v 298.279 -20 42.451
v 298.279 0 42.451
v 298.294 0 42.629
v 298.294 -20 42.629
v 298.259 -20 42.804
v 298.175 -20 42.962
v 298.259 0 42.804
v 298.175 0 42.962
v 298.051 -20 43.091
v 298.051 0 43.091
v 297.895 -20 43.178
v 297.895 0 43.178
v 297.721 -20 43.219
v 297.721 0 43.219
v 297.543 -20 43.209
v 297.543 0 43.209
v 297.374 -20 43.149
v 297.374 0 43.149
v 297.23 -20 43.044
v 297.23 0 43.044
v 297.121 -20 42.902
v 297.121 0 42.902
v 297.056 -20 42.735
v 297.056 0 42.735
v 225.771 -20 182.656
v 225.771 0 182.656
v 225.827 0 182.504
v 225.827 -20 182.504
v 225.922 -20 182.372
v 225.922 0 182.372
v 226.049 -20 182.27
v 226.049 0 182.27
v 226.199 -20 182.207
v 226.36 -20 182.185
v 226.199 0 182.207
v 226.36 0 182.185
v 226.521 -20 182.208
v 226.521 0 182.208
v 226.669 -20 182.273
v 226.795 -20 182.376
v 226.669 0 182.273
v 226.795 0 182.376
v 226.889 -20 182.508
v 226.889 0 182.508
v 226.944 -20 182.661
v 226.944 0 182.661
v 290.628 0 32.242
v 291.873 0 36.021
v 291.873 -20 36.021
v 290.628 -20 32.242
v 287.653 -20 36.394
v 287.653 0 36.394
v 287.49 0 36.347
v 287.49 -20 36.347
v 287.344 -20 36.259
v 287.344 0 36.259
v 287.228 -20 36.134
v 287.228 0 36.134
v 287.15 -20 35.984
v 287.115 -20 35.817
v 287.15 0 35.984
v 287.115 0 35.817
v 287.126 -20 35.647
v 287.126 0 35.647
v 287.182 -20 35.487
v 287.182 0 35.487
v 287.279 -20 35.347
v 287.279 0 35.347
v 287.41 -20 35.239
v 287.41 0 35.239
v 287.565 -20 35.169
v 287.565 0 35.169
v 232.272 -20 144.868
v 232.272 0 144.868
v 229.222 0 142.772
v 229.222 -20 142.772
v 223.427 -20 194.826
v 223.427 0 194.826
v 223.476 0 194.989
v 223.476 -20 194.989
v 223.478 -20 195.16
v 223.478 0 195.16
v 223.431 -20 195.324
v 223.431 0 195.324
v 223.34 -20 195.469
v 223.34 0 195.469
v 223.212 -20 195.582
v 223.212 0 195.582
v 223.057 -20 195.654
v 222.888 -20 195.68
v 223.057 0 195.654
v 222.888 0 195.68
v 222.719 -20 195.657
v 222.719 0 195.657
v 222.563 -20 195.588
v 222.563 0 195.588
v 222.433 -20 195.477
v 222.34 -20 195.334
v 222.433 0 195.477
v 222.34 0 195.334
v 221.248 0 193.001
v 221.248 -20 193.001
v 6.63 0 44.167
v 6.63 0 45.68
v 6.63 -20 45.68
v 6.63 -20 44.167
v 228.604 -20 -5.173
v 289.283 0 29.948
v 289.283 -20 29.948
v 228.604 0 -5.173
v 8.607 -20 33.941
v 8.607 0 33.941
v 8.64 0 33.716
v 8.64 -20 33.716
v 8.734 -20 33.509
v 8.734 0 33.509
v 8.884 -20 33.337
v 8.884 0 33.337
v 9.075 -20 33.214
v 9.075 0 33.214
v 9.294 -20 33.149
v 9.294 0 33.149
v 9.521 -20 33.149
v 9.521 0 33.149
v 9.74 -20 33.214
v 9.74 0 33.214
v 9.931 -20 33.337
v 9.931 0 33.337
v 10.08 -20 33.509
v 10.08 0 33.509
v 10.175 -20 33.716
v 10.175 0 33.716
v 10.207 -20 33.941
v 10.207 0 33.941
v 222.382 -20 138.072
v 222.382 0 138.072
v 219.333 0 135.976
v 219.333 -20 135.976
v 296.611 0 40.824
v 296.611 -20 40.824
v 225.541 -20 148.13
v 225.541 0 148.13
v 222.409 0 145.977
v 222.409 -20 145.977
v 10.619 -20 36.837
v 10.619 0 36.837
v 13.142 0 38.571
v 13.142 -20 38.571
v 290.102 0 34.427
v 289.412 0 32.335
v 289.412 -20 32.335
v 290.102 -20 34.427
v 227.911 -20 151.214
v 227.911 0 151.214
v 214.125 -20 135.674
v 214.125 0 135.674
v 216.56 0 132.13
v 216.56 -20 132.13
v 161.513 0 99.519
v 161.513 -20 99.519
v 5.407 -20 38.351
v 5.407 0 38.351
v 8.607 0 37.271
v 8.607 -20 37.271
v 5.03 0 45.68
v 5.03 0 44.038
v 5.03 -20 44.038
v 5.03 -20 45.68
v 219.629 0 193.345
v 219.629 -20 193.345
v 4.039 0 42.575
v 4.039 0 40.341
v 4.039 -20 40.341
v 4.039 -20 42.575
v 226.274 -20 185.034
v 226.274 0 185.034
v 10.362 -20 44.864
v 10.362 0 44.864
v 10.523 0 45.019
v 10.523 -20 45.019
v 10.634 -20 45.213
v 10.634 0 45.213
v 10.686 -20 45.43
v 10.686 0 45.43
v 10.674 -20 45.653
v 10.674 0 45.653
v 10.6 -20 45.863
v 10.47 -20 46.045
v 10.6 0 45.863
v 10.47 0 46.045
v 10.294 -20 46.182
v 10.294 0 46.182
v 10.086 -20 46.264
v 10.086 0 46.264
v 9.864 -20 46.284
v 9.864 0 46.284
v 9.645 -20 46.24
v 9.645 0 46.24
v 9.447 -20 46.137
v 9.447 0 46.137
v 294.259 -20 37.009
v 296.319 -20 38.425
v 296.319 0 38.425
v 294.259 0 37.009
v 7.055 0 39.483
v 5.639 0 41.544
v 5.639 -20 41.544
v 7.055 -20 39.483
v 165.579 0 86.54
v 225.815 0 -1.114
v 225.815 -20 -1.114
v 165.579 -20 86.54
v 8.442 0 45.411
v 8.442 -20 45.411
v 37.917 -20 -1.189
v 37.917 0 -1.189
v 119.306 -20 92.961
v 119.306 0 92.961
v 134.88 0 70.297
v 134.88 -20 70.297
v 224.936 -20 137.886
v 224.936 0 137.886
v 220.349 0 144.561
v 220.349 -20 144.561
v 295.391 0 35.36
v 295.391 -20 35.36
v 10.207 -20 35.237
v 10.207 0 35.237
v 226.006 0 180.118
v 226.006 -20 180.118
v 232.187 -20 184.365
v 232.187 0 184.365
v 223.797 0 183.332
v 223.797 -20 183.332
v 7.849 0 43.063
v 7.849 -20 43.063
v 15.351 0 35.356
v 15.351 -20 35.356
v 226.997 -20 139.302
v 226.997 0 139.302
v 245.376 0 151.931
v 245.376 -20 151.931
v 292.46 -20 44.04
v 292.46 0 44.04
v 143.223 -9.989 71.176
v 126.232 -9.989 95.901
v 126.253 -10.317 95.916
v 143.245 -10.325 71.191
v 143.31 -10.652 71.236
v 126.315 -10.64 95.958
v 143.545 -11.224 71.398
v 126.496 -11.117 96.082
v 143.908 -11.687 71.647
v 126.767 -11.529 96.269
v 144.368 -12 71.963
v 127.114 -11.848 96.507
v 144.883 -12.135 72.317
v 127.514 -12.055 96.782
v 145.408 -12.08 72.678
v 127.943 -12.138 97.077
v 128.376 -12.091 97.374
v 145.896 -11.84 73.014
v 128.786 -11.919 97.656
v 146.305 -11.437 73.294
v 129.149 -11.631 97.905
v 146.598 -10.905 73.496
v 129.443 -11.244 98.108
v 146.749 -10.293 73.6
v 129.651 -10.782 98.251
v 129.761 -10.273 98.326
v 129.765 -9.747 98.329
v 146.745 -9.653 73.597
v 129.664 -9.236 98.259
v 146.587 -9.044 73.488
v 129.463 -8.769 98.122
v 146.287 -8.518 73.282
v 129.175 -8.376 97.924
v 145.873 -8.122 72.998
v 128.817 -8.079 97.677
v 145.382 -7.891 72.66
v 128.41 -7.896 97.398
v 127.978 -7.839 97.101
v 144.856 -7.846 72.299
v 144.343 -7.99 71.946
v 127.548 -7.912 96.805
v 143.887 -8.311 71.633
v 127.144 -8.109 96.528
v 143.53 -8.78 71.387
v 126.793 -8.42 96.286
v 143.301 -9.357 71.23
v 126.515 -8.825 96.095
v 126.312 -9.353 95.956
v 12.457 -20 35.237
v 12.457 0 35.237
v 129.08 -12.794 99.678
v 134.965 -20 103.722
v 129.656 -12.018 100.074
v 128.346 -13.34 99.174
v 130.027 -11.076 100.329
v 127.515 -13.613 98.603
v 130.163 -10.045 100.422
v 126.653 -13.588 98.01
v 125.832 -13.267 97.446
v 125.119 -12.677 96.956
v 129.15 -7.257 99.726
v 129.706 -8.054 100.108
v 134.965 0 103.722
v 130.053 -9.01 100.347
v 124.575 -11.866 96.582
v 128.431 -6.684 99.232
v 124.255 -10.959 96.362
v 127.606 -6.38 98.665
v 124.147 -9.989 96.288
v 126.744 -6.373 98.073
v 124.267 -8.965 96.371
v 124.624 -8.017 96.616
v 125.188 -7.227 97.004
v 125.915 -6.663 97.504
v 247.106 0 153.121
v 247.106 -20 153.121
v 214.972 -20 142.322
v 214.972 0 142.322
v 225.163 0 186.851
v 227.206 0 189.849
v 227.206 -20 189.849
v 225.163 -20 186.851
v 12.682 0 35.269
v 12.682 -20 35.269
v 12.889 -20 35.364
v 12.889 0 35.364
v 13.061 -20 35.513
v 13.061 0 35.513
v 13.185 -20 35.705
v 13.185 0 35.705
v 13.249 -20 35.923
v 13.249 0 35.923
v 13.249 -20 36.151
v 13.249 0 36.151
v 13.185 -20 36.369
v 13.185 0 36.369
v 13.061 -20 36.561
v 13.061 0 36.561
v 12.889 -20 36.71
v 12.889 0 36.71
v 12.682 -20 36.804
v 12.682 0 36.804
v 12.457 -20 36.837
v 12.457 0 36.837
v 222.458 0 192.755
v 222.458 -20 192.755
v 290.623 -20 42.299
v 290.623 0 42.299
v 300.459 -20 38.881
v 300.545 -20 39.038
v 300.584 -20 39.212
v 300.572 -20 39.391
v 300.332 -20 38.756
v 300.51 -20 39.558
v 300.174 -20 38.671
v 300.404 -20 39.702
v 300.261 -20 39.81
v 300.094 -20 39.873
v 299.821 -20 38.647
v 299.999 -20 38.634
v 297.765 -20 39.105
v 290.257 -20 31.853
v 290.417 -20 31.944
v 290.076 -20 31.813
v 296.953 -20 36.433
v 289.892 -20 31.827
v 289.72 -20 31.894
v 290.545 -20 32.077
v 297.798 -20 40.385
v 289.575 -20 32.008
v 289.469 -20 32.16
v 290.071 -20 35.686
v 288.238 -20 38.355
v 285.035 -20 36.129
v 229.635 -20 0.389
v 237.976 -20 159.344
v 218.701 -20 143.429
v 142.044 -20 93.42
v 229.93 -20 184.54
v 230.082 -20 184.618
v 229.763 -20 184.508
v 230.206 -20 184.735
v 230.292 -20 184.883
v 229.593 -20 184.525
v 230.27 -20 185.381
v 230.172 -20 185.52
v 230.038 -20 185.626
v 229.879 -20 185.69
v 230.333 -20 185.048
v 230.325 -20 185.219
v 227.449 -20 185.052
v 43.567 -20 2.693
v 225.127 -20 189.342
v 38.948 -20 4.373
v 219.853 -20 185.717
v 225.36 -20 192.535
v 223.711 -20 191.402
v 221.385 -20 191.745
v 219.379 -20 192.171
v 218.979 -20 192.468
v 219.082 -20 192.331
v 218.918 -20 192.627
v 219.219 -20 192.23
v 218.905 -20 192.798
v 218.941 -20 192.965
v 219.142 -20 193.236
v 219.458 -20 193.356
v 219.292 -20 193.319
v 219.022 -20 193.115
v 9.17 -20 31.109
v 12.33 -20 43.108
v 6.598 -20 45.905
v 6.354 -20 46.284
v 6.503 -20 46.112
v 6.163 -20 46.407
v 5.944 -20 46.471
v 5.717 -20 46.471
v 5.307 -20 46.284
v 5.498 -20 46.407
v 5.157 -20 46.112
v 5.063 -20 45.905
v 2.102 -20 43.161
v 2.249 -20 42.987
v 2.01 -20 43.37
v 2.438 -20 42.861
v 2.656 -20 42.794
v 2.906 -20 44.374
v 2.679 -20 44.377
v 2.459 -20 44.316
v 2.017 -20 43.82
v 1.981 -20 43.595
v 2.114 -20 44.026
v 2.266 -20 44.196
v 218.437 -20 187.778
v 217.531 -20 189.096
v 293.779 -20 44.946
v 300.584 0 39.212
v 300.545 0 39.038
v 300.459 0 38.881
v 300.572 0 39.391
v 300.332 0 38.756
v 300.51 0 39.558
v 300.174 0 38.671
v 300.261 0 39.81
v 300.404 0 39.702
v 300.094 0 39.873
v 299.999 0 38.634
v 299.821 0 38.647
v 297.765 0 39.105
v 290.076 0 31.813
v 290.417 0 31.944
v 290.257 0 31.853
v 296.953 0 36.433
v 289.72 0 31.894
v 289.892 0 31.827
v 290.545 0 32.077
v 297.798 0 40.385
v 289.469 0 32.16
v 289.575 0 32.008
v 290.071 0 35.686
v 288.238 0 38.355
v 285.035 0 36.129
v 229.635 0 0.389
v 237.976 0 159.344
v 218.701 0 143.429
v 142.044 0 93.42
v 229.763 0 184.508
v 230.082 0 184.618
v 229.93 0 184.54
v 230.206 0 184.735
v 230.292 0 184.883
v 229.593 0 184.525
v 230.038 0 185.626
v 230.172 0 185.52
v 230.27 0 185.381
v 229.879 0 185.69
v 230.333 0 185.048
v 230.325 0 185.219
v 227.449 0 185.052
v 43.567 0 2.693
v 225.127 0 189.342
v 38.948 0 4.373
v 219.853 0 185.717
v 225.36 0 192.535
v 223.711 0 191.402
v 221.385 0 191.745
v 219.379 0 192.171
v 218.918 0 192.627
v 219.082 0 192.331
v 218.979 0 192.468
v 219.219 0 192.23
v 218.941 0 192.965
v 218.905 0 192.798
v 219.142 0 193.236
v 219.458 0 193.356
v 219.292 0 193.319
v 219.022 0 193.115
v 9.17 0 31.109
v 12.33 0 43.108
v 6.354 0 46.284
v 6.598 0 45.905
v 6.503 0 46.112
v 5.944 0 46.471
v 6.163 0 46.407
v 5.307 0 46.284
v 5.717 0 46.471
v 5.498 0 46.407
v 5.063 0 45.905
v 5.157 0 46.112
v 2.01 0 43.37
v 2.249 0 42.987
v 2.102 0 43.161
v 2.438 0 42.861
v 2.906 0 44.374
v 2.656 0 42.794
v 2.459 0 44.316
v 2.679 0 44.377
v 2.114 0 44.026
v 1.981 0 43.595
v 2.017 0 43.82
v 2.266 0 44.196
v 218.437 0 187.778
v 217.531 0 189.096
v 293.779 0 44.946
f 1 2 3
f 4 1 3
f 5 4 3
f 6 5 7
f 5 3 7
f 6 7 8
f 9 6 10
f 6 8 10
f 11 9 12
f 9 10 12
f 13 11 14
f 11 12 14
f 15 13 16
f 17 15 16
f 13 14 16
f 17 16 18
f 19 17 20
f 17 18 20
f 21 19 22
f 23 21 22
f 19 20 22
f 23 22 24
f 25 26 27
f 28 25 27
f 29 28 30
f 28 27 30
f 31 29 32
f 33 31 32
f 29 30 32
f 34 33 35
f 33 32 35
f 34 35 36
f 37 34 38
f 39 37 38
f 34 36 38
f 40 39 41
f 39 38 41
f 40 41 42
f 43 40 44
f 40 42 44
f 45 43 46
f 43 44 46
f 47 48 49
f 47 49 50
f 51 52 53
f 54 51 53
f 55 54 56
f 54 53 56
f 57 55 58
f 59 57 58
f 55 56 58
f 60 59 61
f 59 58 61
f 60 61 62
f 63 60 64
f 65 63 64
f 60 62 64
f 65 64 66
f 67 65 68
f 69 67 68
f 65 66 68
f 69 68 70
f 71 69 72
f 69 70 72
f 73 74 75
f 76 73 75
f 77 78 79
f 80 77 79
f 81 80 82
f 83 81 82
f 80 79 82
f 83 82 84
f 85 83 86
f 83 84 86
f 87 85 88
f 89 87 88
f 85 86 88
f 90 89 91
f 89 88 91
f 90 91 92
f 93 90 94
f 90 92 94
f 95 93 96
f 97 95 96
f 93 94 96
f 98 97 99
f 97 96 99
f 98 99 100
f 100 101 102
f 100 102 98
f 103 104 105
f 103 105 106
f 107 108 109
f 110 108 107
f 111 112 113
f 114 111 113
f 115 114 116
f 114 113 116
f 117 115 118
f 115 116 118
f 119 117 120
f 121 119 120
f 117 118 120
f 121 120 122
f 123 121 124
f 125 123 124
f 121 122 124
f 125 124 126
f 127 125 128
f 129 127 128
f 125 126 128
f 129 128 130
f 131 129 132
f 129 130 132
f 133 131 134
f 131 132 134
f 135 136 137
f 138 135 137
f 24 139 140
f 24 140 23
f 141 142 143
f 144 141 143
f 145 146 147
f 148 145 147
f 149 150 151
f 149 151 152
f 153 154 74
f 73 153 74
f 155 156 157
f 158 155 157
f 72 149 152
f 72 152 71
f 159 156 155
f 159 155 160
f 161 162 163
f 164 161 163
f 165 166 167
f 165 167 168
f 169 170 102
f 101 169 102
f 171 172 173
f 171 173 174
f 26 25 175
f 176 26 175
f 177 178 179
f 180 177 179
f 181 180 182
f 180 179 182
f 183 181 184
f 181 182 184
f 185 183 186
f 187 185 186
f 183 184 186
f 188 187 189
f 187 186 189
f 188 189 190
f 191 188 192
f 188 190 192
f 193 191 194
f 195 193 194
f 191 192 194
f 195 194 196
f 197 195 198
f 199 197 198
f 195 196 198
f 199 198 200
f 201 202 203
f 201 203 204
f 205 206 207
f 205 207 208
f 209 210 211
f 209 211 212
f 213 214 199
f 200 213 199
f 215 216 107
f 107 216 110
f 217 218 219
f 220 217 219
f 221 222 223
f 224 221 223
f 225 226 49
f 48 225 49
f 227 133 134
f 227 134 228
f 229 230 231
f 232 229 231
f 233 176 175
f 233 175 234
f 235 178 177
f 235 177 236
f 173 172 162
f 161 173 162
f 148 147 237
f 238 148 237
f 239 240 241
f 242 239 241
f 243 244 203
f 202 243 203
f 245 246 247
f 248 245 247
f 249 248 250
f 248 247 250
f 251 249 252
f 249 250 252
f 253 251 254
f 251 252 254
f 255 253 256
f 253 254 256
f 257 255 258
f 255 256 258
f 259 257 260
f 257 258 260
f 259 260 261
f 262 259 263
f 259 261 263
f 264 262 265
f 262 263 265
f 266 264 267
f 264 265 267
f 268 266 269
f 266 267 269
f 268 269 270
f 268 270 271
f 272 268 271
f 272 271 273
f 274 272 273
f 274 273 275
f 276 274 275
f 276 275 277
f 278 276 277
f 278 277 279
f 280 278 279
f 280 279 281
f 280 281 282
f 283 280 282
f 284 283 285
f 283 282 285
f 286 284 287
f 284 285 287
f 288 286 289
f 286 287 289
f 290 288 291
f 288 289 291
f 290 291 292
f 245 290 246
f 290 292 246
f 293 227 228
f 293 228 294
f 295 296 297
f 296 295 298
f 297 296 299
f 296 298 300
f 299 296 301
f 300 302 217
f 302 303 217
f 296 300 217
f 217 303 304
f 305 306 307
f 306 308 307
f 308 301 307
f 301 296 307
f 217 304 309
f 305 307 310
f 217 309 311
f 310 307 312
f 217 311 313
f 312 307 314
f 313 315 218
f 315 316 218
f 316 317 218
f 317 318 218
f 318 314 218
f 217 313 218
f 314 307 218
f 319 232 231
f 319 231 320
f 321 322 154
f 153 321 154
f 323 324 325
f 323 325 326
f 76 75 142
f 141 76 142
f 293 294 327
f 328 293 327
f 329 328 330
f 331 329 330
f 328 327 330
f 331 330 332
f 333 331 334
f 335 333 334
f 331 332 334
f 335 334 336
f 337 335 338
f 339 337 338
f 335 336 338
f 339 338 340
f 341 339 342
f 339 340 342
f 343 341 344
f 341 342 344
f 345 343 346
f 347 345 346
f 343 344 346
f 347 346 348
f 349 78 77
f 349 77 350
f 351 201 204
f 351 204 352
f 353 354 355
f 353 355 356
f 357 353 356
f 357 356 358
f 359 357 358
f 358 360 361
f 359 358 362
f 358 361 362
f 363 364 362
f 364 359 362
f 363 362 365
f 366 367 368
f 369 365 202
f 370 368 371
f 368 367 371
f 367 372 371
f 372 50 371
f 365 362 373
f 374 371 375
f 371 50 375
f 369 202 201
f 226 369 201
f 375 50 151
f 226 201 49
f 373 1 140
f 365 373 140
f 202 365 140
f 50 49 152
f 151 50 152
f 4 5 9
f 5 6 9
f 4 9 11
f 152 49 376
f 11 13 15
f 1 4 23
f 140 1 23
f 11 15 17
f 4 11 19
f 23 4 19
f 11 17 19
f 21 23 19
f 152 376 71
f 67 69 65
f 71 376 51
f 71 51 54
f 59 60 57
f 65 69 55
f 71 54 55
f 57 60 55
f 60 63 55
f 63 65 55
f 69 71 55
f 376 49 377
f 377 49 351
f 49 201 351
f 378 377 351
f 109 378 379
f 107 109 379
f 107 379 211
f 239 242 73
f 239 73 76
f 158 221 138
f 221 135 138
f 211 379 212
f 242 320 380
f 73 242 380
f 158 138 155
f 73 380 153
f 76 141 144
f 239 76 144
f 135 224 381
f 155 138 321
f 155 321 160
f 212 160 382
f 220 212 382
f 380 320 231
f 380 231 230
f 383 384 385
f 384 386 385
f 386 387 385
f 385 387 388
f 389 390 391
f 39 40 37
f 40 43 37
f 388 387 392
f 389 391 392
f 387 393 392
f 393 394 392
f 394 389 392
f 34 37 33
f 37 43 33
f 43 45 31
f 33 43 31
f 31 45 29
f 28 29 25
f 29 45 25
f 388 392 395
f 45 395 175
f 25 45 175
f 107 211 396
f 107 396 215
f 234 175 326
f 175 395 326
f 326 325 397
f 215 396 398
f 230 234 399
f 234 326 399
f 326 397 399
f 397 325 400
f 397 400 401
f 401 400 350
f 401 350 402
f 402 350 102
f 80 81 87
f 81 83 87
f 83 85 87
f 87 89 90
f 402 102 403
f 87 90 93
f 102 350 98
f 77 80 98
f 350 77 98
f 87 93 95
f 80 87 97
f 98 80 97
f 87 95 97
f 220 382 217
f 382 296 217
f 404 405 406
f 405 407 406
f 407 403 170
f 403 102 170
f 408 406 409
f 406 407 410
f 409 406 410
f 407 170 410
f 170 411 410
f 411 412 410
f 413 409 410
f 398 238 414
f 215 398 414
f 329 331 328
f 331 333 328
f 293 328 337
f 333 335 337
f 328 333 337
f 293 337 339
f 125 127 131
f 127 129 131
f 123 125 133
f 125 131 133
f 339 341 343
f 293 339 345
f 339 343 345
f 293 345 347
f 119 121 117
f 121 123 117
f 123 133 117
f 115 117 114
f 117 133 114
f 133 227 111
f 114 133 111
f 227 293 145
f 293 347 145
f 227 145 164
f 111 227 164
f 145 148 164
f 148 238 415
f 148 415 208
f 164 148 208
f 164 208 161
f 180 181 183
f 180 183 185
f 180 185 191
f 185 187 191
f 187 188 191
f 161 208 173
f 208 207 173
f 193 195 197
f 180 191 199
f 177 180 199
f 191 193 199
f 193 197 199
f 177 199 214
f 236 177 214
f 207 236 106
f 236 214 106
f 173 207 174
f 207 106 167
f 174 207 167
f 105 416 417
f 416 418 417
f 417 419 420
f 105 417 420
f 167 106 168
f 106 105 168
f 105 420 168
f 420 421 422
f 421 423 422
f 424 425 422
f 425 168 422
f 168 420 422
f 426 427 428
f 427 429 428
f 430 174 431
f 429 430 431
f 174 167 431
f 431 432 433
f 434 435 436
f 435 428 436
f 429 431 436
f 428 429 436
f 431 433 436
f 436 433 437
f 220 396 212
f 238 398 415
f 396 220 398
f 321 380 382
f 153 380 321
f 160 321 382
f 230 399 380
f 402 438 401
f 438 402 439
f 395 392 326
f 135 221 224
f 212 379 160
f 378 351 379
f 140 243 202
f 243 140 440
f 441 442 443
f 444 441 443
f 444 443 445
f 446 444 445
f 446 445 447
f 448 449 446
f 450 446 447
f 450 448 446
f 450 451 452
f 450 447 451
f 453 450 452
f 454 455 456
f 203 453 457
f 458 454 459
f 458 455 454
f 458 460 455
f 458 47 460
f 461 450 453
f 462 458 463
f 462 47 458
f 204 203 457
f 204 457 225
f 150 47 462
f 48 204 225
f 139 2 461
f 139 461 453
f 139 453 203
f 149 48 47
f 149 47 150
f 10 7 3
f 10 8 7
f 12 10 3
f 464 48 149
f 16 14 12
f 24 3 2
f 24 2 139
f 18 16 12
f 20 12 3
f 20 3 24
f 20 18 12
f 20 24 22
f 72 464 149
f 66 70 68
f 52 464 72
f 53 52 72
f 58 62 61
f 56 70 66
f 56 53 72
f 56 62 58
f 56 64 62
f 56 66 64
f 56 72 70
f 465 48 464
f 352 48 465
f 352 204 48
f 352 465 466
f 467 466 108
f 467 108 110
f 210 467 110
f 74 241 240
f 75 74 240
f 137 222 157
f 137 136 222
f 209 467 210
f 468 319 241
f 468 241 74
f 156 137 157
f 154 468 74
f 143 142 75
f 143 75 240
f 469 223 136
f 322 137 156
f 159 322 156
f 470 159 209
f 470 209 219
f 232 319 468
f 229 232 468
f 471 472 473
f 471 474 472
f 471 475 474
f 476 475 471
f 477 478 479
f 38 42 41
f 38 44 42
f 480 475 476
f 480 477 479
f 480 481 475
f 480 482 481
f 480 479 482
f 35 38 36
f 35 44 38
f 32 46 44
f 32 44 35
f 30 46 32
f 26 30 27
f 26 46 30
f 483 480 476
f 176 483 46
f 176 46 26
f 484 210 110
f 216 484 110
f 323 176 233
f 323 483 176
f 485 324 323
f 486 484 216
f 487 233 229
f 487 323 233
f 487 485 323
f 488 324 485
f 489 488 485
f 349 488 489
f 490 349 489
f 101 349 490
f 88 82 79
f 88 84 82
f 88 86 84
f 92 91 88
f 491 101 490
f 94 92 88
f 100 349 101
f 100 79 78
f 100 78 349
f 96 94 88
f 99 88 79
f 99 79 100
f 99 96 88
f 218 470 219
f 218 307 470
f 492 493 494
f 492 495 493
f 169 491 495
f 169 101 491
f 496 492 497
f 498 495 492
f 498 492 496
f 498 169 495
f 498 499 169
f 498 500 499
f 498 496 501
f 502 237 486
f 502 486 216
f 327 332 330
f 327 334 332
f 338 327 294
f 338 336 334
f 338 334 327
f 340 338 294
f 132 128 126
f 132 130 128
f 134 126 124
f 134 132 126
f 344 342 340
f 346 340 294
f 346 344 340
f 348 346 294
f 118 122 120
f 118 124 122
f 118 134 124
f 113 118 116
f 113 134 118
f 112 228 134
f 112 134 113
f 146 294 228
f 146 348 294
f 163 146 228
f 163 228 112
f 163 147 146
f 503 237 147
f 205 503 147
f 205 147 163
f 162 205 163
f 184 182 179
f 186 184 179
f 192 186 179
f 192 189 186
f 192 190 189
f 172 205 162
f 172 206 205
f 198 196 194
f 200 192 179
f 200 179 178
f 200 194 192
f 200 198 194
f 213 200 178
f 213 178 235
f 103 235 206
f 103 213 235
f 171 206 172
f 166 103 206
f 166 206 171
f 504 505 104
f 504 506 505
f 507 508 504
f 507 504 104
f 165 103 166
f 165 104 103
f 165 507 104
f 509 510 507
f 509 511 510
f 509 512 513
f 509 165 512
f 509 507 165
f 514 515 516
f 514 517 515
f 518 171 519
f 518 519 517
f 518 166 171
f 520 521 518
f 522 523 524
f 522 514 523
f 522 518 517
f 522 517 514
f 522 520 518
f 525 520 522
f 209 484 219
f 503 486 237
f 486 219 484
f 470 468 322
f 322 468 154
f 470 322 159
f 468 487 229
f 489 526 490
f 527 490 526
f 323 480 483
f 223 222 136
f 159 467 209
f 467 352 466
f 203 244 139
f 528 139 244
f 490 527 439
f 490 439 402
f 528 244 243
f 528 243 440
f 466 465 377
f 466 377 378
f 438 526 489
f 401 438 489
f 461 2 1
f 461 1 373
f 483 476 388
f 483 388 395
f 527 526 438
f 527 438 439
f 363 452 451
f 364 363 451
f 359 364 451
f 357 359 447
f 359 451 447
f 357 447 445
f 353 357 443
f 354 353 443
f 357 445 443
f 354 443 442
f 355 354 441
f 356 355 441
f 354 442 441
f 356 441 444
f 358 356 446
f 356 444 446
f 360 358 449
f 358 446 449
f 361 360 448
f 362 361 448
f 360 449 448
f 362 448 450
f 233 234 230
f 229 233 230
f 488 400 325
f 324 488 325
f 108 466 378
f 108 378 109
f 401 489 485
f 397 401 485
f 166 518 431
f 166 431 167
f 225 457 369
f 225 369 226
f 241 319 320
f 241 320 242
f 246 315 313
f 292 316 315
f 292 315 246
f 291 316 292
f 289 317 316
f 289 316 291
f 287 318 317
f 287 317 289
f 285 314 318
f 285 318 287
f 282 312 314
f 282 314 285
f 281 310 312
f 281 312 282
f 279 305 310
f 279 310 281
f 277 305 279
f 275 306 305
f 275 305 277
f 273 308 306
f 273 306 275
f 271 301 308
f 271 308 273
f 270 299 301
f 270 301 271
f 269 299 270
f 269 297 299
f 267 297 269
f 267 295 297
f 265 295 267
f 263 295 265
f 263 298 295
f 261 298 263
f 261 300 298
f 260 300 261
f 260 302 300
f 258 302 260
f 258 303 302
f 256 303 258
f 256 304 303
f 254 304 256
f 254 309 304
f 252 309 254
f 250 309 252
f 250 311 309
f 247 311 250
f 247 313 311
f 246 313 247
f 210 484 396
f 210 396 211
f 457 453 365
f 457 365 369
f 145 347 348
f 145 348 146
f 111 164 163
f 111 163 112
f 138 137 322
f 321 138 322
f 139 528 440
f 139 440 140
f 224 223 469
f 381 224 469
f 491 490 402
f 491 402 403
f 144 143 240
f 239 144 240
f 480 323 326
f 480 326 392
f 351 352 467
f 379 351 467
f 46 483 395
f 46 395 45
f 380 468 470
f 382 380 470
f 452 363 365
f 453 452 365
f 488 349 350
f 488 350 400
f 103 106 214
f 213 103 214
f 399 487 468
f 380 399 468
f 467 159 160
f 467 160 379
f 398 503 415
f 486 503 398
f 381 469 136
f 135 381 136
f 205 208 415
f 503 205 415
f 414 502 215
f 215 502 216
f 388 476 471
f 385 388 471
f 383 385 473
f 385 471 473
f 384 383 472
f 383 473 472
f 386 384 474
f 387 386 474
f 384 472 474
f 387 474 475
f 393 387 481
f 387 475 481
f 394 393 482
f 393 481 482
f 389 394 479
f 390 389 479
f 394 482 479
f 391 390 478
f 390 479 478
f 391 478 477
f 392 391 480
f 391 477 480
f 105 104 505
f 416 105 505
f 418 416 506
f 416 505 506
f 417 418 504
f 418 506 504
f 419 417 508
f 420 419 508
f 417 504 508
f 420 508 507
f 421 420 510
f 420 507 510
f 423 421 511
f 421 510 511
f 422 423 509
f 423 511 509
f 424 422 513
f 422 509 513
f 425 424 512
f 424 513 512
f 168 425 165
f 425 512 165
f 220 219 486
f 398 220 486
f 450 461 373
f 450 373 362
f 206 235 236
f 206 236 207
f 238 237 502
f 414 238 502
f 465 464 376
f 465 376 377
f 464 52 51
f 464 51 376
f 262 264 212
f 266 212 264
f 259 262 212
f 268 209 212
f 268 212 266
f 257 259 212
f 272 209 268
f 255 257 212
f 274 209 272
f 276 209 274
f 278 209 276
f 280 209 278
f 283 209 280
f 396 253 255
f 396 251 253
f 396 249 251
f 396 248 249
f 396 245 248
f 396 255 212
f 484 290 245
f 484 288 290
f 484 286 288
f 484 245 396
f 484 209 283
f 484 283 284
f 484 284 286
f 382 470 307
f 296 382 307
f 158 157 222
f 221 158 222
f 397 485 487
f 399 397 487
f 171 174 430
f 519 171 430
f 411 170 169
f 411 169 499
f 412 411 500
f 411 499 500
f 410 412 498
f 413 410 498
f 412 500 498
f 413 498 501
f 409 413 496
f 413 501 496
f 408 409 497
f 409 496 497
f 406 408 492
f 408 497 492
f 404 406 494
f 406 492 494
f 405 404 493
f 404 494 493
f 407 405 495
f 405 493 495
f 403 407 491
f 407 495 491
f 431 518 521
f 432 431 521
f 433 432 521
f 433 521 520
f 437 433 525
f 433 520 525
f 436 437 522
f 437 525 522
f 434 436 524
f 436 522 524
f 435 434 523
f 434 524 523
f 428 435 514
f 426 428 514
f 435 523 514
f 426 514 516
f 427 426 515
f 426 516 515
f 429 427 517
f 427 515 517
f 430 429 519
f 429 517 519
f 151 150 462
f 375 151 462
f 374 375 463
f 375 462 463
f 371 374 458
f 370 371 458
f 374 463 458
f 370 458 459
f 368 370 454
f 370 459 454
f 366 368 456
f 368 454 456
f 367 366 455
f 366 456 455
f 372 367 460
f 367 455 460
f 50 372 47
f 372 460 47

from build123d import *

# Parameters (mm, degrees)
PAD_DEPTH    = 20
SKETCH001_R  = 2.15
POCKET_DEPTH = 47
CHAMFER_SIZE = 1.5


with BuildPart() as part:
    # Sketch → Pad (new body)
    with BuildSketch(Plane.XZ):
        with BuildLine():
            Line((4.039009, 42.574694), (2.655848, 42.793836))
            ThreePointArc((2.906222, 44.374125), (1.990891, 43.709168), (2.655848, 42.793836))
            Line((2.906222, 44.374125), (5.030423, 44.037575))
            Line((5.030423, 44.037575), (5.030423, 45.679508))
            ThreePointArc((6.630423, 45.679508), (5.830423, 46.479508), (5.030423, 45.679508))
            Line((6.630423, 45.679508), (6.630423, 44.166555))
            Line((6.630423, 44.166555), (8.44155, 45.411155))
            Line((8.44155, 45.411155), (9.447306, 46.1366))
            ThreePointArc((10.36219, 44.864349), (10.54179, 45.958576), (9.447306, 46.1366))
            Line((10.36219, 44.864349), (7.849046, 43.062615))
            Line((7.849046, 43.062615), (5.639009, 41.543887))
            Line((5.639009, 41.543887), (7.054906, 39.48349))
            Line((7.054906, 39.48349), (12.329523, 43.108185))
            Line((12.329523, 43.108185), (38.948379, 4.372717))
            Line((134.880474, 70.296864), (38.948379, 4.372717))
            Line((119.305612, 92.961233), (134.880474, 70.296864))
            Line((134.96463, 103.722048), (119.305612, 92.961233))
            Line((142.044114, 93.420062), (134.96463, 103.722048))
            Line((237.976209, 159.344209), (142.044114, 93.420062))
            Line((219.852732, 185.717293), (237.976209, 159.344209))
            Line((225.127349, 189.341989), (219.852732, 185.717293))
            Line((223.711452, 191.402386), (225.127349, 189.341989))
            Line((218.436835, 187.77769), (223.711452, 191.402386))
            Line((218.436835, 187.77769), (217.530661, 189.096345))
            Line((217.530661, 189.096345), (221.384849, 191.744926))
            Line((221.384849, 191.744926), (219.379319, 192.170864))
            ThreePointArc((219.628617, 193.344683), (218.917058, 192.882422), (219.379319, 192.170864))
            Line((219.628617, 193.344683), (221.24827, 193.000698))
            Line((221.24827, 193.000698), (222.339521, 195.334027))
            ThreePointArc((223.426518, 194.825661), (223.137203, 195.623343), (222.339521, 195.334027))
            Line((223.426518, 194.825661), (222.458309, 192.755421))
            Line((222.458309, 192.755421), (225.35977, 192.535103))
            Line((225.35977, 192.535103), (227.205855, 189.8487))
            Line((227.205855, 189.8487), (225.162842, 186.850988))
            Line((225.162842, 186.850988), (229.879355, 185.690134))
            ThreePointArc((229.592563, 184.524909), (230.318572, 184.964126), (229.879355, 185.690134))
            Line((229.592563, 184.524909), (227.449372, 185.052402))
            Line((227.449372, 185.052402), (226.943935, 182.66136))
            ThreePointArc((225.77104, 182.655995), (226.359652, 182.185457), (226.943935, 182.66136))
            Line((225.77104, 182.655995), (226.273638, 185.03361))
            Line((226.273638, 185.03361), (223.79734, 183.331907))
            Line((223.79734, 183.331907), (226.006139, 180.117688))
            Line((226.006139, 180.117688), (232.18733, 184.365377))
            Line((232.18733, 184.365377), (247.106338, 153.120807))
            Line((247.106338, 153.120807), (245.375605, 151.931453))
            Line((226.996861, 139.301656), (245.375605, 151.931453))
            Line((222.409356, 145.977343), (226.996861, 139.301656))
            Line((225.54116, 148.129505), (222.409356, 145.977343))
            Line((229.222491, 142.772473), (225.54116, 148.129505))
            Line((232.271879, 144.868), (229.222491, 142.772473))
            Line((227.910918, 151.214023), (232.271879, 144.868))
            Line((214.971623, 142.322192), (227.910918, 151.214023))
            Line((219.332585, 135.976169), (214.971623, 142.322192))
            Line((222.381972, 138.071696), (219.332585, 135.976169))
            Line((218.700641, 143.428729), (222.381972, 138.071696))
            Line((220.348959, 144.561446), (218.700641, 143.428729))
            Line((224.936464, 137.885759), (220.348959, 144.561446))
            Line((216.560272, 132.129674), (224.936464, 137.885759))
            Line((214.12493, 135.673557), (216.560272, 132.129674))
            Line((214.12493, 135.673557), (161.513364, 99.519102))
            Line((161.513364, 99.519102), (229.635216, 0.388931))
            Line((290.622974, 42.299471), (229.635216, 0.388931))
            Line((294.258763, 37.008711), (290.622974, 42.299471))
            Line((296.31916, 38.424607), (294.258763, 37.008711))
            Line((292.460363, 44.039886), (296.31916, 38.424607))
            Line((292.460363, 44.039886), (293.779018, 44.94606))
            Line((293.779018, 44.94606), (296.611353, 40.824476))
            Line((296.611353, 40.824476), (297.055734, 42.735476))
            ThreePointArc((298.27896, 42.451029), (297.809571, 43.204865), (297.055734, 42.735476))
            Line((298.27896, 42.451029), (297.79847, 40.384748))
            Line((297.79847, 40.384748), (300.094356, 39.873139))
            ThreePointArc((299.821203, 38.647342), (300.570678, 39.123664), (300.094356, 39.873139))
            Line((299.821203, 38.647342), (297.765407, 39.10545))
            Line((297.765407, 39.10545), (296.952983, 36.433452))
            Line((296.952983, 36.433452), (295.39148, 35.360393))
            Line((295.39148, 35.360393), (291.873432, 36.02126))
            Line((291.873432, 36.02126), (290.627867, 32.242369))
            ThreePointArc((289.412187, 32.33524), (289.983665, 31.812832), (290.627867, 32.242369))
            Line((289.412187, 32.33524), (290.101718, 34.427194))
            Line((290.101718, 34.427194), (287.564776, 35.169274))
            ThreePointArc((287.653171, 36.393701), (287.114763, 35.817166), (287.564776, 35.169274))
            Line((287.653171, 36.393701), (290.071377, 35.686353))
            Line((290.071377, 35.686353), (288.237588, 38.354863))
            Line((288.237588, 38.354863), (285.035062, 36.129048))
            Line((285.035062, 36.129048), (289.282752, 29.947856))
            Line((289.282752, 29.947856), (228.604015, -5.17314))
            Line((37.917178, -1.189353), (228.604015, -5.17314))
            Line((9.169934, 31.108727), (37.917178, -1.189353))
            Line((15.351126, 35.356416), (9.169934, 31.108727))
            Line((13.142327, 38.570636), (15.351126, 35.356416))
            Line((10.619339, 36.836849), (13.142327, 38.570636))
            Line((12.456819, 36.836849), (10.619339, 36.836849))
            ThreePointArc((12.456819, 35.236849), (13.256819, 36.036849), (12.456819, 36.836849))
            Line((10.207431, 35.236849), (12.456819, 35.236849))
            Line((10.207431, 33.941322), (10.207431, 35.236849))
            ThreePointArc((8.607431, 33.941322), (9.407431, 33.141322), (10.207431, 33.941322))
            Line((8.607431, 37.271491), (8.607431, 33.941322))
            Line((5.406588, 38.350772), (8.607431, 37.271491))
            Line((4.039009, 40.340858), (5.406588, 38.350772))
            Line((4.039009, 40.340858), (4.039009, 42.574694))
        make_face()
        Polygon((43.567429, 2.693476), (225.814584, -1.113991), (165.579391, 86.539602), align=None, mode=Mode.SUBTRACT)
    extrude(amount=PAD_DEPTH)

    # Sketch001 (on DatumPlane) → Pocket (cut)
    with BuildSketch(Plane(origin=(-5.122749, 0, 7.454568), x_dir=(-0.824159, 0, -0.566359), z_dir=(-0.566359, 0, 0.824159))):
        with Locations((-160.5, 9.989038)):
            Circle(SKETCH001_R)
    extrude(amount=-POCKET_DEPTH, mode=Mode.SUBTRACT)

    # Chamfer
    chamfer_edges = [part.edges().sort_by_distance(p)[0] for p in [
        (128.926695, -9.989038, 99.572803),
    ]]
    chamfer(chamfer_edges, length=CHAMFER_SIZE)


solid = part.part
